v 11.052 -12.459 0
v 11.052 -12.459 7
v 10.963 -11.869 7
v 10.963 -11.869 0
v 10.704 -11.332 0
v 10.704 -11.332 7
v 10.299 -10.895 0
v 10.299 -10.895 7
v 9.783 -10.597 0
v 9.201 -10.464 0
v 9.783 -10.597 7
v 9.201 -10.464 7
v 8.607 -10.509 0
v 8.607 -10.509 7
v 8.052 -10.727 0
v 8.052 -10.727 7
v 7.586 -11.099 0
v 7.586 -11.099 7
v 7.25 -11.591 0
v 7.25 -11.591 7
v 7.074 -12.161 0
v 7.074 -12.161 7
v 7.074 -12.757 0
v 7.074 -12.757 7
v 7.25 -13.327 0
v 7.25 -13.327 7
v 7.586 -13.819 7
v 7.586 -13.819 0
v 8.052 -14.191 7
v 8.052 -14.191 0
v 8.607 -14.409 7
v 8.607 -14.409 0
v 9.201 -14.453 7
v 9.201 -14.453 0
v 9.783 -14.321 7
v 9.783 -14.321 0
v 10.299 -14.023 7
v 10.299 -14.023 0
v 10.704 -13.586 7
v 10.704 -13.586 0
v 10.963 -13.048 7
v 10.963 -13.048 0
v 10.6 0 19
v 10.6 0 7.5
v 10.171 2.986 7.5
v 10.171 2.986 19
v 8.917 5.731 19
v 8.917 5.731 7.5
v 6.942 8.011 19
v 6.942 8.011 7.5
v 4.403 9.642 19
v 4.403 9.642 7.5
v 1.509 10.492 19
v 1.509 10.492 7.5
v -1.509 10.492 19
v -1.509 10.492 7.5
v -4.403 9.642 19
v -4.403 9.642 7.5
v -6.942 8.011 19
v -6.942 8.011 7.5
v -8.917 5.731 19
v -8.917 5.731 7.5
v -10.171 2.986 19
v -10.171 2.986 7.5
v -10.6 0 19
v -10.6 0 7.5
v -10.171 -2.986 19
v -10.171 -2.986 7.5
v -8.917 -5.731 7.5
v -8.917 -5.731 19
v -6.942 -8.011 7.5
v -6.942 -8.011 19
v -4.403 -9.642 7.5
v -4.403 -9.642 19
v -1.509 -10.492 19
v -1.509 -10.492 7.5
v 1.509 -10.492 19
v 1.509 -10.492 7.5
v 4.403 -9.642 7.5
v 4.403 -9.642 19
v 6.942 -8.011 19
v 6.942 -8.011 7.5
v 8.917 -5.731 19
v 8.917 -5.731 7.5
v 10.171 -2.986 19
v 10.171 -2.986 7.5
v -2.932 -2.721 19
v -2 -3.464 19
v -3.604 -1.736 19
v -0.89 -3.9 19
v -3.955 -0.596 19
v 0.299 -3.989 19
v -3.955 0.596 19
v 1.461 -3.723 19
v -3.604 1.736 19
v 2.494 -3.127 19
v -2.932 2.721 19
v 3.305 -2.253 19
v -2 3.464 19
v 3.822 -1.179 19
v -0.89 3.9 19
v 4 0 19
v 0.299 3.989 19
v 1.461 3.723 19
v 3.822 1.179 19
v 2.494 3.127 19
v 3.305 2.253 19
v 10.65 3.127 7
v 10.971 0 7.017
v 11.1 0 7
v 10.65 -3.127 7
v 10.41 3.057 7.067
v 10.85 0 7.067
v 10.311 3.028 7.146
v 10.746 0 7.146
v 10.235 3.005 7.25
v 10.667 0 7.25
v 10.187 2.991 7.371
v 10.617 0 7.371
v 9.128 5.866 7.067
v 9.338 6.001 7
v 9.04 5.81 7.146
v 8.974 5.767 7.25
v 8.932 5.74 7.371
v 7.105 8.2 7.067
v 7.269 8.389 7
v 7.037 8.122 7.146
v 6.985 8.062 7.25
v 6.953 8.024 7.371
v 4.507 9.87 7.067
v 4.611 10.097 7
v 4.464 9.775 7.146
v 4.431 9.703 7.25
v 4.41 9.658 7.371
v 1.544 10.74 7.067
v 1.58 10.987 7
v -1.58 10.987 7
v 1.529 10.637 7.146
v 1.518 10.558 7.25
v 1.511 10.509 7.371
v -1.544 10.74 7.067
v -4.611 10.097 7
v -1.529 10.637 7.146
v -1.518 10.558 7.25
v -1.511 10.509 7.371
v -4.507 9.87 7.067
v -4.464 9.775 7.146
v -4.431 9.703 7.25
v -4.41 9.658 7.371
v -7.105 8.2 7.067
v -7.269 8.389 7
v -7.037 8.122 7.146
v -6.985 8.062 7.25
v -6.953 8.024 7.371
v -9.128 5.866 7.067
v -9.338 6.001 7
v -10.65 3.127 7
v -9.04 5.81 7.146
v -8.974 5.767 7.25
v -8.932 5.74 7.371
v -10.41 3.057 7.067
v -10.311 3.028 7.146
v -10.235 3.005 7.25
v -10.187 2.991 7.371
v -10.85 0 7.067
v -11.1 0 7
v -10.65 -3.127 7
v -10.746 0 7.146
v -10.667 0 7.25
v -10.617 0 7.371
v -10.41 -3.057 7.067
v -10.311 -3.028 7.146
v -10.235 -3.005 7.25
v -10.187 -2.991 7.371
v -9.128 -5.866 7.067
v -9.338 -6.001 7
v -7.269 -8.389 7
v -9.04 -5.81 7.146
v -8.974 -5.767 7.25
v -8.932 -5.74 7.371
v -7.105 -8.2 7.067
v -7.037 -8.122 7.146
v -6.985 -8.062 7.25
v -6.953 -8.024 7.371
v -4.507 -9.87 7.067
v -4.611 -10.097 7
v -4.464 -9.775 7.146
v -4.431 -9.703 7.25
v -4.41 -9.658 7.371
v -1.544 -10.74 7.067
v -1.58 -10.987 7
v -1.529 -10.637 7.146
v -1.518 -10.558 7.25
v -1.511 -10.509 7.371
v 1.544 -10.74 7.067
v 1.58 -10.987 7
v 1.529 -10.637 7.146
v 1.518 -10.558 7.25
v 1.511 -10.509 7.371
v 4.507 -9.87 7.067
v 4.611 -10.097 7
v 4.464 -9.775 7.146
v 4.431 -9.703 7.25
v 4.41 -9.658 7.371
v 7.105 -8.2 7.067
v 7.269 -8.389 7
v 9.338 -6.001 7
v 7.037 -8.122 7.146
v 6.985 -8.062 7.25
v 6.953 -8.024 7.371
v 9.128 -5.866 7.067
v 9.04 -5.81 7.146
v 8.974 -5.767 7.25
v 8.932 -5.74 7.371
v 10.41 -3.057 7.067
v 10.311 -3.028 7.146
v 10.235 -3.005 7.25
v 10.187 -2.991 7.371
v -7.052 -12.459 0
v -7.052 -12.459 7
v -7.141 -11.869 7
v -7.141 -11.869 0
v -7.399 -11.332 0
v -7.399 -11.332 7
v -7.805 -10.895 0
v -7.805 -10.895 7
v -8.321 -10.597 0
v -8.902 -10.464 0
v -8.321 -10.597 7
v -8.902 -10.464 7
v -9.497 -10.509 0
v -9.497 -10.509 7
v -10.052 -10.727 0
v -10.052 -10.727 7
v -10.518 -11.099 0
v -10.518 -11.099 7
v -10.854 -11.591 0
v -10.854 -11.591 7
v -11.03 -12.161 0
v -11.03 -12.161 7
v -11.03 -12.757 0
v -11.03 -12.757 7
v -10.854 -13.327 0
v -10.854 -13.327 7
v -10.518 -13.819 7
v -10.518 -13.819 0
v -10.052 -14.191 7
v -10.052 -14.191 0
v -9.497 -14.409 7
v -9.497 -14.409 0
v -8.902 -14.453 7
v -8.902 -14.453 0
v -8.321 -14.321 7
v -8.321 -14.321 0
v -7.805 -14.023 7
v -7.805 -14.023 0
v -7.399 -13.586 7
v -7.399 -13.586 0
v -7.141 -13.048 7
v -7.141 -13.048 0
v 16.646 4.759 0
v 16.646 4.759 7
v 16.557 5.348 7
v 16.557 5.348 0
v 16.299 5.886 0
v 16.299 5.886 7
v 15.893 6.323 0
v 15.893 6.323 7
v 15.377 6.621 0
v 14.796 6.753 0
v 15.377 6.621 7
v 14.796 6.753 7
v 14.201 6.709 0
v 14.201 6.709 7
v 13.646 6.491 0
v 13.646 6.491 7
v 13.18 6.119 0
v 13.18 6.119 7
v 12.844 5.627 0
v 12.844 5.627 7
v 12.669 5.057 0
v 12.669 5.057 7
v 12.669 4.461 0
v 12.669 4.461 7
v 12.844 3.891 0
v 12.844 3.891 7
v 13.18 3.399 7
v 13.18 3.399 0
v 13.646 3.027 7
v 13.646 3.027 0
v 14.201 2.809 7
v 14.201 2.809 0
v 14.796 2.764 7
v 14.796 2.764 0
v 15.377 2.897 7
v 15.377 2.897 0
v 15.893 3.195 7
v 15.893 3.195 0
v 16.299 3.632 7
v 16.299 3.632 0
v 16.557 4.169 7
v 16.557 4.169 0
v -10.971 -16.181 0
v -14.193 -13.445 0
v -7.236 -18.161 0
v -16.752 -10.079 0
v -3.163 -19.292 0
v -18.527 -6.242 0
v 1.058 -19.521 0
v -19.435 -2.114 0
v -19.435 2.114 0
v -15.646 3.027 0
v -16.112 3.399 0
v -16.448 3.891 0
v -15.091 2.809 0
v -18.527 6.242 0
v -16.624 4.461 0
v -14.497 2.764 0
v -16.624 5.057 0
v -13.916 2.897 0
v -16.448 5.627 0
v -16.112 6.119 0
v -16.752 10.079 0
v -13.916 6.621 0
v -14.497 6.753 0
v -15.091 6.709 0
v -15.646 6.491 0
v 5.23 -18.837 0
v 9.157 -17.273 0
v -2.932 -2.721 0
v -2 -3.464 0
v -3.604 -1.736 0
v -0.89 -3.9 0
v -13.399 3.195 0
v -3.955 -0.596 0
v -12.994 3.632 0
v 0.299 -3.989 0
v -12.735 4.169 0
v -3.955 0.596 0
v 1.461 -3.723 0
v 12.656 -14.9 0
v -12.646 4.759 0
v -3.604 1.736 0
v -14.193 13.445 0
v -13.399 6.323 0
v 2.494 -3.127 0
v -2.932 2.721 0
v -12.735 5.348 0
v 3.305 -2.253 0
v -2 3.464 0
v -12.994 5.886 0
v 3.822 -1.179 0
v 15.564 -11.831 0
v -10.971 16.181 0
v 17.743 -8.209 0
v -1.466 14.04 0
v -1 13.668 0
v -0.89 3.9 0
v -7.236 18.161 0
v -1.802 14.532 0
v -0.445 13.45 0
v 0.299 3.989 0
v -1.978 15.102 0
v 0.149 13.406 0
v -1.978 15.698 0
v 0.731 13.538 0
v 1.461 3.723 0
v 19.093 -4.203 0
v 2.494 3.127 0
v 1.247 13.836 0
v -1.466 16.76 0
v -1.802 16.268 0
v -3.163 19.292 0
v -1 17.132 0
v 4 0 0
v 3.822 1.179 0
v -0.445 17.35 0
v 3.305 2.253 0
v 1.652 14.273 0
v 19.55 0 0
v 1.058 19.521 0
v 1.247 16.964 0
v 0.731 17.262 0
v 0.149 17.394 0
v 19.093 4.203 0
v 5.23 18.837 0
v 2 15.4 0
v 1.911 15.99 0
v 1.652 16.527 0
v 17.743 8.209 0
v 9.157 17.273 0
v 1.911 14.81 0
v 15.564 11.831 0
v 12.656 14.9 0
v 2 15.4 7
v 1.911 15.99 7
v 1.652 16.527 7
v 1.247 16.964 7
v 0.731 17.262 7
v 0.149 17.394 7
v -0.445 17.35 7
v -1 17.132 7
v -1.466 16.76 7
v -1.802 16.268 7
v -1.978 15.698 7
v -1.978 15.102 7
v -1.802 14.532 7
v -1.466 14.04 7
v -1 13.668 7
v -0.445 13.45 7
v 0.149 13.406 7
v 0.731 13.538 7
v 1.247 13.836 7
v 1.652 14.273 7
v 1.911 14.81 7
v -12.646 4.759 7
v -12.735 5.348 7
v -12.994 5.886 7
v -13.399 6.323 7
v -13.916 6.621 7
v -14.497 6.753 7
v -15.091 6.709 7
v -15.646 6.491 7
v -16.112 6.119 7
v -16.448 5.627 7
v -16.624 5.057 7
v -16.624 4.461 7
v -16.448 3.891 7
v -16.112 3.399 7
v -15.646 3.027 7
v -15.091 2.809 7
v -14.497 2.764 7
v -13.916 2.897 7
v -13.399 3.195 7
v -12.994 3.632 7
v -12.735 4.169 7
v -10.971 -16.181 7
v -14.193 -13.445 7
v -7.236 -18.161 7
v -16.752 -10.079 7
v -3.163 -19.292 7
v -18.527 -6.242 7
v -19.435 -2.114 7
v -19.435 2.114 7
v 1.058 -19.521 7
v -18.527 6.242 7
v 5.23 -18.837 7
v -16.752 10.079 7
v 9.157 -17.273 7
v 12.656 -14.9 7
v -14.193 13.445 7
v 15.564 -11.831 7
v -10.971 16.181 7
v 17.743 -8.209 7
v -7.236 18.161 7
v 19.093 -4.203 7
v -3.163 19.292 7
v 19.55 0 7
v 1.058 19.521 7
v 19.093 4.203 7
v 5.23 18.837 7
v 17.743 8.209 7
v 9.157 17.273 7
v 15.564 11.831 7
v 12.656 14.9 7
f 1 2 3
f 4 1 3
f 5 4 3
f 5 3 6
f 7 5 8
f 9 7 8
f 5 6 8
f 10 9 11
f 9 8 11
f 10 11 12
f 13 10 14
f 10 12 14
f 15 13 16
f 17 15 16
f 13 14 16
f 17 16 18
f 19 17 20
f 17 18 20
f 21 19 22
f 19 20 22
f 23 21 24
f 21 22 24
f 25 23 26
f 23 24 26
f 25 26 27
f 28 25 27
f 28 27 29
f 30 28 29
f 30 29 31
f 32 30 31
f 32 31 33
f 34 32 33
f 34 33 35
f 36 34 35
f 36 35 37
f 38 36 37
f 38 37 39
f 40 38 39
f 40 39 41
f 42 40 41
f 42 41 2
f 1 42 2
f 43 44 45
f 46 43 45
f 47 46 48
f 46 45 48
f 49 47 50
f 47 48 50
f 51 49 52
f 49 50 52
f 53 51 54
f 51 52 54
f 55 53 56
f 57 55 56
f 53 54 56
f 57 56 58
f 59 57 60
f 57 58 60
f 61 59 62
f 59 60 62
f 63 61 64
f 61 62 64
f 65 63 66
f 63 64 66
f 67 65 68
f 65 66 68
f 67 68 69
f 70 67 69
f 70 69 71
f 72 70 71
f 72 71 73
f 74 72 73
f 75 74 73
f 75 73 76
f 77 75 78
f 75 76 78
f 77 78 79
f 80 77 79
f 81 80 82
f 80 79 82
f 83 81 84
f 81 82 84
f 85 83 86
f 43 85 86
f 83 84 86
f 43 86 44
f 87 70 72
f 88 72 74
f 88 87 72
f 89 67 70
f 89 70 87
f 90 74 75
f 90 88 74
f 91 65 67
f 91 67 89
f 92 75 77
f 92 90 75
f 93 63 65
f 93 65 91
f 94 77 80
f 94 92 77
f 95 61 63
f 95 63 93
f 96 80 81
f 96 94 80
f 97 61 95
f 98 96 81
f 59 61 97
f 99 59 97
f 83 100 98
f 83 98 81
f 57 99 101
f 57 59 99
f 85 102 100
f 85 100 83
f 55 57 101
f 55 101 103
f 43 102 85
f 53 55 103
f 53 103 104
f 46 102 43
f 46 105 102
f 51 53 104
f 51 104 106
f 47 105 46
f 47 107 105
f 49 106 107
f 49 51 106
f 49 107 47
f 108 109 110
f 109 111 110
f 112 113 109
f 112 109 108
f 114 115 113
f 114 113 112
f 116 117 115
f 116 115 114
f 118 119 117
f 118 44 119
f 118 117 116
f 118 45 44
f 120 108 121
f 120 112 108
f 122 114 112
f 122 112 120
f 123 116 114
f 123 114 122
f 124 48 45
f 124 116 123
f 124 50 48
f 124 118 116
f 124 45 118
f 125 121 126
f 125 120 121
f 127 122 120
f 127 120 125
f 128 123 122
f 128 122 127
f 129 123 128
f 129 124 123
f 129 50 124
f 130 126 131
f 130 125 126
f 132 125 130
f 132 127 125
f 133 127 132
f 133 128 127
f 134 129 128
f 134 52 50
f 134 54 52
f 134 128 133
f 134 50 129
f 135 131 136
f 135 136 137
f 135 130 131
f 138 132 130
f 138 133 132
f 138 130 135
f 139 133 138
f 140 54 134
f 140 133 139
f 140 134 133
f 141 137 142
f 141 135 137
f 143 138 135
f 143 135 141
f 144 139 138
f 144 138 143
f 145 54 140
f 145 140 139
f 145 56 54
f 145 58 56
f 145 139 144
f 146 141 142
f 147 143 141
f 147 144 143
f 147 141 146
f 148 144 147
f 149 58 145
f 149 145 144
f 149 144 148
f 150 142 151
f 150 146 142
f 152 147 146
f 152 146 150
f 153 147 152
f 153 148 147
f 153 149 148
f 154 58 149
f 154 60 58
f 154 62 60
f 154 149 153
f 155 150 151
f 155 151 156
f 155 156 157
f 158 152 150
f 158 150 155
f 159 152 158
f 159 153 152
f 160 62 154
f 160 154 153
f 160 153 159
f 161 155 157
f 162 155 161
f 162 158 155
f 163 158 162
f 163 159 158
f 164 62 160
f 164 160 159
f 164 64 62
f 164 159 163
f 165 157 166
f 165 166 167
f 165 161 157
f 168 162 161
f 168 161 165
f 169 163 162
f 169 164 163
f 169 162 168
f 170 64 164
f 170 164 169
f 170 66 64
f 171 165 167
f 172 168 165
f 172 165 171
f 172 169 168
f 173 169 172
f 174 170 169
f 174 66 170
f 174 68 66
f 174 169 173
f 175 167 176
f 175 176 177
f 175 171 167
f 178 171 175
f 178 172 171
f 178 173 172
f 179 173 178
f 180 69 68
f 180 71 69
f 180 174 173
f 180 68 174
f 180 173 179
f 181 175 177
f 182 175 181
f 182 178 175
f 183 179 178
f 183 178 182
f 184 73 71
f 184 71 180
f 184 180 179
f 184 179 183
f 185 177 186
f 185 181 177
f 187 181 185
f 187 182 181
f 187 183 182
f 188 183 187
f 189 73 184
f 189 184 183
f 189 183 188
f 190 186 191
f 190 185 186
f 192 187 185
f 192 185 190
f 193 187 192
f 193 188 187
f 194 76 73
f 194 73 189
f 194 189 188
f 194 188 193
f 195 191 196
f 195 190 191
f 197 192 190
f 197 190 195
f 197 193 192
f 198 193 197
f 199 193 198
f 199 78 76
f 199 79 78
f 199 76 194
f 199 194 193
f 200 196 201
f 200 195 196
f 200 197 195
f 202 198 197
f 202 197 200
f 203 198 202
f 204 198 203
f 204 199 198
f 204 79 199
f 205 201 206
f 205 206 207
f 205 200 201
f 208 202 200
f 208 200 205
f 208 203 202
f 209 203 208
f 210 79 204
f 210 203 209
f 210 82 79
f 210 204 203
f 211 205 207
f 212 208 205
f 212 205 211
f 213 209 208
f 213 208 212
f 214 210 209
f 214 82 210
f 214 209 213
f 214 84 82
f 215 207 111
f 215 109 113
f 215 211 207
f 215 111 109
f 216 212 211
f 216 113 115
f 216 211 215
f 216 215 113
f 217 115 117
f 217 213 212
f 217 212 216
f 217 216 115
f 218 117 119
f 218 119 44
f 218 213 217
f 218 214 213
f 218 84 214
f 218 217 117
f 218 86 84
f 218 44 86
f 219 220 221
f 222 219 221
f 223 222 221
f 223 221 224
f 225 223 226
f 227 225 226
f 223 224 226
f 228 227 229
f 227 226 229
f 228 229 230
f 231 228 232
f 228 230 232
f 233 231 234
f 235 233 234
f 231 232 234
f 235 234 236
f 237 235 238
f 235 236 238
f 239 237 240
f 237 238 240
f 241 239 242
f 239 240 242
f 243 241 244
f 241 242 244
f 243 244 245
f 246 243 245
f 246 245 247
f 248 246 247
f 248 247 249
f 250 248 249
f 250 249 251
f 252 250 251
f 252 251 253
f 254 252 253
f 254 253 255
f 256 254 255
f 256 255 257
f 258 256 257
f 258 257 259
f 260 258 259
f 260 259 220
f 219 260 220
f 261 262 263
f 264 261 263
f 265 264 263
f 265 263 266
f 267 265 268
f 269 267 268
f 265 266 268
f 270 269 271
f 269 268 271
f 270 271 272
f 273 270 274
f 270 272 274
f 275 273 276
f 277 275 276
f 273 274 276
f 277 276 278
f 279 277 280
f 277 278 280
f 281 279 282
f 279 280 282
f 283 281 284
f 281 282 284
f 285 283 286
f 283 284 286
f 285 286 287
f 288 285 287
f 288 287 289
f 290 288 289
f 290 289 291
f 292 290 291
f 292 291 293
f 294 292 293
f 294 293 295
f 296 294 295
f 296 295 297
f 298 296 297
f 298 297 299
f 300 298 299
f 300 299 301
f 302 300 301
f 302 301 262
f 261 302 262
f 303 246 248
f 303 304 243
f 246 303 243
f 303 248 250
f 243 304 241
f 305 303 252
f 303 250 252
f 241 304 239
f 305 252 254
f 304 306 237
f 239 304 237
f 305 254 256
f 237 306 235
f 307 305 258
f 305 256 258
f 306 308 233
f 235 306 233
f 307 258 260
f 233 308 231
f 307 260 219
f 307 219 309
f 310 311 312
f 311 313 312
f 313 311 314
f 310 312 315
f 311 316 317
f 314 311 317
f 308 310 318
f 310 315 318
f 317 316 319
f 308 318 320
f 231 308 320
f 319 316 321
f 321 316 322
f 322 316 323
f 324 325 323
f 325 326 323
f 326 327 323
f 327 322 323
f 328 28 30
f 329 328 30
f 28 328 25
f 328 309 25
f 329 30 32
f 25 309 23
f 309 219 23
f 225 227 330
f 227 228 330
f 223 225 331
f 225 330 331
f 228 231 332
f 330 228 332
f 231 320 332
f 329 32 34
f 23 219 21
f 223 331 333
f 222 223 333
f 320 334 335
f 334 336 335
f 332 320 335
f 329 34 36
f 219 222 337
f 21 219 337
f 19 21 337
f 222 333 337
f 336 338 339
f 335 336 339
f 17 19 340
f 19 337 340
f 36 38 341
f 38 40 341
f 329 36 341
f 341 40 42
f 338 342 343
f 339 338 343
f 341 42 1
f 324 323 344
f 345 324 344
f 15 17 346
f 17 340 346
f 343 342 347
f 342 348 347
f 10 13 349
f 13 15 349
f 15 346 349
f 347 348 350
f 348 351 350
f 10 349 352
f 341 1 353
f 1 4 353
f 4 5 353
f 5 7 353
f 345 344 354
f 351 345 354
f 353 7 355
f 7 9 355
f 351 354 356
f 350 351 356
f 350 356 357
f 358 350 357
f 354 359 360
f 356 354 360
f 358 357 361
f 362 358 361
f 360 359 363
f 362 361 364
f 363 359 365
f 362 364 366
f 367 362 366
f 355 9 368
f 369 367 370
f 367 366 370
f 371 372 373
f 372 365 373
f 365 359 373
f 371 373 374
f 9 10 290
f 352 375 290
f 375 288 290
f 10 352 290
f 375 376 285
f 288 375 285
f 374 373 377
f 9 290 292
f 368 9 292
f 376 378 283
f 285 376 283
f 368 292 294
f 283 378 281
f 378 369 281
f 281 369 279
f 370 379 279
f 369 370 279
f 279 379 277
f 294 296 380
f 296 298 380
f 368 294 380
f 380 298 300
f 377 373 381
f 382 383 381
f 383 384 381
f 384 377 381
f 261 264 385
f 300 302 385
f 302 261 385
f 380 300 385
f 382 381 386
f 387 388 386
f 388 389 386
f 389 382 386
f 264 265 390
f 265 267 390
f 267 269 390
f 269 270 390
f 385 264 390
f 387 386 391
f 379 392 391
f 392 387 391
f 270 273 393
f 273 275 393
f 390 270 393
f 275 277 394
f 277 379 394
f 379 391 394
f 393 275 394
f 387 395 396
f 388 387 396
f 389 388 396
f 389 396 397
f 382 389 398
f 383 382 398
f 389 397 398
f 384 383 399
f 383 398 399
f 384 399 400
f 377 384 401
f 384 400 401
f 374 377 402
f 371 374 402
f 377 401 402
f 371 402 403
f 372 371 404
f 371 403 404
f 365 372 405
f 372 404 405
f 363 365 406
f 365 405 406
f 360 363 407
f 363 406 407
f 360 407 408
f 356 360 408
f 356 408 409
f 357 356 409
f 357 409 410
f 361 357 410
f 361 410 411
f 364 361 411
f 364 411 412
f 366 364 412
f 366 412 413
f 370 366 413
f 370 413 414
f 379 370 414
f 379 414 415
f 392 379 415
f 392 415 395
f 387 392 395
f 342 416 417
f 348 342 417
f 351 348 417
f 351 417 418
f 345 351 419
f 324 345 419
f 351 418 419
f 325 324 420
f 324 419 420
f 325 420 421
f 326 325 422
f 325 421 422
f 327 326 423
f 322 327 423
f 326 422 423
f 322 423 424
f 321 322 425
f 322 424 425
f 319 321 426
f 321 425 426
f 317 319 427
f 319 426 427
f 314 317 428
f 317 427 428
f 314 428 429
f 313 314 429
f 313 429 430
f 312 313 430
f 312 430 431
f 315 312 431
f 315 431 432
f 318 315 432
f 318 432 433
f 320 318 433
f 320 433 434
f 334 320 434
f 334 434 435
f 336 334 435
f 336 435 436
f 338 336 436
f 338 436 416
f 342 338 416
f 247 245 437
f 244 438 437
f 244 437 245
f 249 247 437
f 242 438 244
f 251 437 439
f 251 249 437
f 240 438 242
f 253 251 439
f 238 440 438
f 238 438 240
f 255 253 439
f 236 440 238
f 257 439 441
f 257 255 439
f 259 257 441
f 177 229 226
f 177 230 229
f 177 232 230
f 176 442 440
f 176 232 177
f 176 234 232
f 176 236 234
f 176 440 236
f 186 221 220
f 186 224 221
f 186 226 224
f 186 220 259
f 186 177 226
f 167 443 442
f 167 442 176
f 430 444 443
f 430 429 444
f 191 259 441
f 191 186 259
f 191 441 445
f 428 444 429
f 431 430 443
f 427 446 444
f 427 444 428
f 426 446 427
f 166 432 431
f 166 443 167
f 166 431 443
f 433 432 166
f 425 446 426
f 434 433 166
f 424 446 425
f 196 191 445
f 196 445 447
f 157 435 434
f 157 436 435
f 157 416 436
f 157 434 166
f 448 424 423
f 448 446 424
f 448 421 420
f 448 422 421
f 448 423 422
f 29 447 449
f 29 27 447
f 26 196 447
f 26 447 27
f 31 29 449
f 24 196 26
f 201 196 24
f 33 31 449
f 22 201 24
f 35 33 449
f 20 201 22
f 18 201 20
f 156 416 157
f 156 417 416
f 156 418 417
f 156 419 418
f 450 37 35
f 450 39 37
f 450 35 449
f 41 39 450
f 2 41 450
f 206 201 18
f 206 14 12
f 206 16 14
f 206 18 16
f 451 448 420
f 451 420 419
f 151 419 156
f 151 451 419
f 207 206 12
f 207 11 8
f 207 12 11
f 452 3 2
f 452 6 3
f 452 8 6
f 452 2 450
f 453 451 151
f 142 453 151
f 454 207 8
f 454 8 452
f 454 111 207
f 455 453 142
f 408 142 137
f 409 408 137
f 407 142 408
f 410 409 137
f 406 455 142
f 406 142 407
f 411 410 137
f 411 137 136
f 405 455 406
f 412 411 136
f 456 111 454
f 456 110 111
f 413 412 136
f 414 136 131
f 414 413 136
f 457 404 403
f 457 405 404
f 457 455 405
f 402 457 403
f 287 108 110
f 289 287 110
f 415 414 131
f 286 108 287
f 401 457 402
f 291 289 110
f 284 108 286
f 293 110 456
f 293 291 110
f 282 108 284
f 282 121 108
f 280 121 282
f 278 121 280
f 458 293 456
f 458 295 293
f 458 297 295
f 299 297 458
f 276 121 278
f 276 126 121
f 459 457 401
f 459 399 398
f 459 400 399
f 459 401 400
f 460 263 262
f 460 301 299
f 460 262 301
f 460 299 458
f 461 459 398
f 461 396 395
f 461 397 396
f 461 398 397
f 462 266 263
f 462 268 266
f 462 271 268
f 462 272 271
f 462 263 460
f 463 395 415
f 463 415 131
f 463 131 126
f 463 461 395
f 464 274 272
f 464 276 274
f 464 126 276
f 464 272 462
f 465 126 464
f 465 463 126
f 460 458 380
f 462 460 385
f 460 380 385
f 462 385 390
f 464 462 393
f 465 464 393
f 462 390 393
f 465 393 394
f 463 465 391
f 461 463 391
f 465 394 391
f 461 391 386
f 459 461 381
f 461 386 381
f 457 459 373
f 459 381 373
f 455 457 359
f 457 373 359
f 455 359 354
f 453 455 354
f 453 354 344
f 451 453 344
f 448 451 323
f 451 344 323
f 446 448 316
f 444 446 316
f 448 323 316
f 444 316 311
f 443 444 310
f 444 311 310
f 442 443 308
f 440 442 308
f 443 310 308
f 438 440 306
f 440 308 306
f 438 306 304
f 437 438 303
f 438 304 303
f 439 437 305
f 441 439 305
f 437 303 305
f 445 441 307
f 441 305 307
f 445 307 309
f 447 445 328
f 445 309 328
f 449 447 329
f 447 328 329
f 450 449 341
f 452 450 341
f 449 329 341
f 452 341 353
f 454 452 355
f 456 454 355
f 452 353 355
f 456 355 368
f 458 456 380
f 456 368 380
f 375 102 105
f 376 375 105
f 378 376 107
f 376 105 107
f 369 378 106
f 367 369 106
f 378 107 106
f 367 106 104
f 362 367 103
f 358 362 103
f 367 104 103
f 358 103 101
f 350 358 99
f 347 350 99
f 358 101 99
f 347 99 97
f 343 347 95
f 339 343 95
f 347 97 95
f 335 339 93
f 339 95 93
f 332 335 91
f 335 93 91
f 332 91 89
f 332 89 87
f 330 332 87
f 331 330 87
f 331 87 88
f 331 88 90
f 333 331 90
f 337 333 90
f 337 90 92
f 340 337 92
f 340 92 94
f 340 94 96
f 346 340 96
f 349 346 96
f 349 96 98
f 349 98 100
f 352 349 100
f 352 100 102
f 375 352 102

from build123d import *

# Parameters (mm, degrees)
SKETCH_1_R          = 19.55
EXTRUDE_1_DEPTH     = 7
SKETCH_2_R          = 10.6
EXTRUDE_2_DEPTH     = 12
FILLET_1_R          = 0.5
SKETCH_3_R          = 4
CUT_EXTRUDE_3_DEPTH = 34.547056503
SKETCH_4_R          = 2
CUT_EXTRUDE_4_DEPTH = 31.139757796


with BuildPart() as part:
    # Эскиз1 → Вытянуть1 (new body)
    with BuildSketch(Plane.XY):
        Circle(SKETCH_1_R)
    extrude(amount=EXTRUDE_1_DEPTH)

    # Эскиз2 → Вытянуть2 (add)
    with BuildSketch(Plane.XY.offset(7)):
        Circle(SKETCH_2_R)
    extrude(amount=EXTRUDE_2_DEPTH)

    # Скругление1
    fillet_1_edges = [part.edges().sort_by_distance(p)[0] for p in [
        (-10.6, 0, 7),
    ]]
    fillet(fillet_1_edges, radius=FILLET_1_R)

    # Эскиз3 → Вытянуть3 (cut, through all)
    with BuildSketch(Plane.XY.offset(19)):
        Circle(SKETCH_3_R)
    extrude(amount=-CUT_EXTRUDE_3_DEPTH, mode=Mode.SUBTRACT)

    # Эскиз4 → Вытянуть4 (cut, through all)
    with BuildSketch(Plane.XY.offset(7)):
        with Locations((0, 15.4)):
            Circle(SKETCH_4_R)
        with Locations((14.646270351, 4.758861713)):
            Circle(SKETCH_4_R)
        with Locations((9.051892885, -12.458861713)):
            Circle(SKETCH_4_R)
        with Locations((-9.051892885, -12.458861713)):
            Circle(SKETCH_4_R)
        with Locations((-14.646270351, 4.758861713)):
            Circle(SKETCH_4_R)
    extrude(amount=-CUT_EXTRUDE_4_DEPTH, mode=Mode.SUBTRACT)


solid = part.part
